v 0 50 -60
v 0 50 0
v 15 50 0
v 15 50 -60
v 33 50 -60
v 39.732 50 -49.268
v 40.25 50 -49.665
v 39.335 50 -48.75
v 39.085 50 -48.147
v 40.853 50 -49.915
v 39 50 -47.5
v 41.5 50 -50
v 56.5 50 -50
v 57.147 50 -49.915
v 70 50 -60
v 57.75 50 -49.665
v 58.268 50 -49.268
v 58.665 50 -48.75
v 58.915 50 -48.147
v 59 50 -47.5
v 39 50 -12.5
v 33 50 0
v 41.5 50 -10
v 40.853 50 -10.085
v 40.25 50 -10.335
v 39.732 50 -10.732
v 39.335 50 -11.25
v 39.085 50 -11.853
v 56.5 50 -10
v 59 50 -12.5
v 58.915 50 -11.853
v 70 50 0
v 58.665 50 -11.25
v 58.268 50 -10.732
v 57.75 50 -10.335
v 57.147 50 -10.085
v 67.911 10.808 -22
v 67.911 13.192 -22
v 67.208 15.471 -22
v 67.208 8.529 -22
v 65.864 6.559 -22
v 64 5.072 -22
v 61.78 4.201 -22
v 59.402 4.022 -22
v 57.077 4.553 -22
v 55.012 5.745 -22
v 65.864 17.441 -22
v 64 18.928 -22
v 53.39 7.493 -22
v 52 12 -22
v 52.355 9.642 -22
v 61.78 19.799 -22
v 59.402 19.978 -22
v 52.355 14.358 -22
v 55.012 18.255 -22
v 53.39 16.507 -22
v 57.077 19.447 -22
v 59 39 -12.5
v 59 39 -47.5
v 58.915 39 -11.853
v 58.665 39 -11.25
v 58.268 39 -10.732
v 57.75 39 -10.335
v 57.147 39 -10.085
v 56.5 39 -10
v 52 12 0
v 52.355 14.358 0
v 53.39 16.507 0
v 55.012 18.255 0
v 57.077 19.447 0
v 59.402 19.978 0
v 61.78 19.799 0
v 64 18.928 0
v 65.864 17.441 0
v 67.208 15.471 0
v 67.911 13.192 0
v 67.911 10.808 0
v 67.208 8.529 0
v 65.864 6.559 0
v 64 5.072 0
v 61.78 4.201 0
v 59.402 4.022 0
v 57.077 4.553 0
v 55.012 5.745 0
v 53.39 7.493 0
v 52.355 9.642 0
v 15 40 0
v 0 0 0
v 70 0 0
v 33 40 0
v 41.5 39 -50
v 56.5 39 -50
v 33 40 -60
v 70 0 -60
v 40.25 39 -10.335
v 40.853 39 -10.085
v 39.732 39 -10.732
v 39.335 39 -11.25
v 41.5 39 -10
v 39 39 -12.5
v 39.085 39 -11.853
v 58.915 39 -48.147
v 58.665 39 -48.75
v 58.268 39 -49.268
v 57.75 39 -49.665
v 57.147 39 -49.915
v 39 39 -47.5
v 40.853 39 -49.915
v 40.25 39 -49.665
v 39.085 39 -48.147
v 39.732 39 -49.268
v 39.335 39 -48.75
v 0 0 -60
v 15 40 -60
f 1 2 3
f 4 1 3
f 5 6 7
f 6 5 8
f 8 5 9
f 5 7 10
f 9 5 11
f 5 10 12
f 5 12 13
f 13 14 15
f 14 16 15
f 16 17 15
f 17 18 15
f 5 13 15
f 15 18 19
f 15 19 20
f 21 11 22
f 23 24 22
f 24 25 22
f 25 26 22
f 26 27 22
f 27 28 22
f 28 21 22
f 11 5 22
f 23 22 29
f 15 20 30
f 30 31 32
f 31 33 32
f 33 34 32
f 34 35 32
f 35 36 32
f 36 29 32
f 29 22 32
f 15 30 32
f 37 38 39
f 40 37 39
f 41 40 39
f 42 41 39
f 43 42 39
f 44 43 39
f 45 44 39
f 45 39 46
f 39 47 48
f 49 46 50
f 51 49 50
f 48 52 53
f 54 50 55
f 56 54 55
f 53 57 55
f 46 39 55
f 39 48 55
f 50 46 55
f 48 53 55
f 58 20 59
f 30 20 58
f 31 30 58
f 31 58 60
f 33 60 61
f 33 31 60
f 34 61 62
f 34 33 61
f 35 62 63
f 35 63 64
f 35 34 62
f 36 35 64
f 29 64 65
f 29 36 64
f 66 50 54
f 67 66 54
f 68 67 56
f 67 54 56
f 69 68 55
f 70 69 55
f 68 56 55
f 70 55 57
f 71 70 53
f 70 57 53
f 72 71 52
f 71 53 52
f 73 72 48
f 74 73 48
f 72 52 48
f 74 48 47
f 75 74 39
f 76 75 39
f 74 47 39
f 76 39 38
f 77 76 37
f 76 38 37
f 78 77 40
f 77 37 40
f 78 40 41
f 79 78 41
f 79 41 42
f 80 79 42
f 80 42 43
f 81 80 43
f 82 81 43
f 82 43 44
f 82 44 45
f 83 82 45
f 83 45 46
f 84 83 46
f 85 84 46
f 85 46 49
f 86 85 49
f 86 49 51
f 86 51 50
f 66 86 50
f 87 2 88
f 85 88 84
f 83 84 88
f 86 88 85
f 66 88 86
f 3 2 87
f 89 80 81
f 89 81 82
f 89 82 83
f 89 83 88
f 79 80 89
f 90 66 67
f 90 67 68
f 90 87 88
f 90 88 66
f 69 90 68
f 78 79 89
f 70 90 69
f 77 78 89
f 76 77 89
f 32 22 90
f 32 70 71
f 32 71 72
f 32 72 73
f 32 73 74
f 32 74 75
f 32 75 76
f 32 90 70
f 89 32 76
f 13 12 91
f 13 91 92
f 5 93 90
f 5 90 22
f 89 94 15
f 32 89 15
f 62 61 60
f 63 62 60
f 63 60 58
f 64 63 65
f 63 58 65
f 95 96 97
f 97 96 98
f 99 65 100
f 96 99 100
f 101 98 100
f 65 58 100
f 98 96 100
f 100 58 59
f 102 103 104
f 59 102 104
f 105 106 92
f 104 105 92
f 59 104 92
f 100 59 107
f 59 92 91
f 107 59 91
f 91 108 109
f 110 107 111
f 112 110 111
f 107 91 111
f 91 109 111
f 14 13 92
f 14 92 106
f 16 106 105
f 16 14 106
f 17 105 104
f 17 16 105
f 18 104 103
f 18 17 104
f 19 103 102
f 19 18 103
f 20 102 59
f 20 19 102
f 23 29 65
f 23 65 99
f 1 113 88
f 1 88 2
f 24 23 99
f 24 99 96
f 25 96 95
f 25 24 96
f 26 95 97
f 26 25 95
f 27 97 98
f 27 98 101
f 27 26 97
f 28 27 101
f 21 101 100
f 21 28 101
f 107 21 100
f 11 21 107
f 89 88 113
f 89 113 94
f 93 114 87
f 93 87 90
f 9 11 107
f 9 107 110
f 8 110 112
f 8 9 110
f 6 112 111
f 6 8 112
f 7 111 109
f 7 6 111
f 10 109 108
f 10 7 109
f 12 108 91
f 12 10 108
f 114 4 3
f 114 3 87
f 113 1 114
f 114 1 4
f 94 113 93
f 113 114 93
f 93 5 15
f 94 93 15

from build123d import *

# Parameters (mm, degrees)
ESBO_O7_W                                      = 70
ESBO_O7_H                                      = 50
RESSALTO_EXTRUS_O3_DEPTH                       = 60
BROCA_DE_ROSQUEAR_PARA_TARRAXA_DE_M1_2X0_D     = 16
BROCA_DE_ROSQUEAR_PARA_TARRAXA_DE_M1_2X0_DEPTH = 22
CORTE_EXTRUS_O2_DEPTH                          = 11
ESBO_O13_W                                     = 18
ESBO_O13_H                                     = 10


with BuildPart() as part:
    # Esboço7 → Ressalto-extrusão3 (new body)
    with BuildSketch(Plane.XY):
        with Locations((35, 25)):
            Rectangle(ESBO_O7_W, ESBO_O7_H)
    extrude(amount=-RESSALTO_EXTRUS_O3_DEPTH)

    # Broca de rosquear para tarraxa de M1.2x0.252
    with Locations(Plane.XY):
        with Locations((60, 12)):
            Hole(BROCA_DE_ROSQUEAR_PARA_TARRAXA_DE_M1_2X0_D / 2, depth=BROCA_DE_ROSQUEAR_PARA_TARRAXA_DE_M1_2X0_DEPTH)

    # Esboço11 → Corte-extrusão2 (cut)
    with BuildSketch(Plane(origin=(0, 50, 0), x_dir=(1, 0, 0), z_dir=(0, 1, 0))):
        with BuildLine():
            Line((41.5, 50), (56.5, 50))
            ThreePointArc((56.5, 50), (58.267766953, 49.267766953), (59, 47.5))
            Line((59, 47.5), (59, 12.5))
            ThreePointArc((59, 12.5), (58.267766953, 10.732233047), (56.5, 10))
            Line((56.5, 10), (41.5, 10))
            ThreePointArc((41.5, 10), (39.732233047, 10.732233047), (39, 12.5))
            Line((39, 12.5), (39, 47.5))
            ThreePointArc((39, 47.5), (39.732233047, 49.267766953), (41.5, 50))
        make_face()
    extrude(amount=-CORTE_EXTRUS_O2_DEPTH, mode=Mode.SUBTRACT)

    # Varredura de corte1: sweep along a path in Esboço16
    with BuildLine(Plane(origin=(0, 50, 0), x_dir=(1, 0, 0), z_dir=(0, 1, 0))) as varredura_de_corte1_path:
        Line((15, 0), (15, 60))
    # Esboço13 → Varredura de corte1 (sweep, cut)
    with BuildSketch(Plane.XY):
        with Locations((24, 45)):
            Rectangle(ESBO_O13_W, ESBO_O13_H)
    sweep(path=varredura_de_corte1_path.line, mode=Mode.SUBTRACT)


solid = part.part
